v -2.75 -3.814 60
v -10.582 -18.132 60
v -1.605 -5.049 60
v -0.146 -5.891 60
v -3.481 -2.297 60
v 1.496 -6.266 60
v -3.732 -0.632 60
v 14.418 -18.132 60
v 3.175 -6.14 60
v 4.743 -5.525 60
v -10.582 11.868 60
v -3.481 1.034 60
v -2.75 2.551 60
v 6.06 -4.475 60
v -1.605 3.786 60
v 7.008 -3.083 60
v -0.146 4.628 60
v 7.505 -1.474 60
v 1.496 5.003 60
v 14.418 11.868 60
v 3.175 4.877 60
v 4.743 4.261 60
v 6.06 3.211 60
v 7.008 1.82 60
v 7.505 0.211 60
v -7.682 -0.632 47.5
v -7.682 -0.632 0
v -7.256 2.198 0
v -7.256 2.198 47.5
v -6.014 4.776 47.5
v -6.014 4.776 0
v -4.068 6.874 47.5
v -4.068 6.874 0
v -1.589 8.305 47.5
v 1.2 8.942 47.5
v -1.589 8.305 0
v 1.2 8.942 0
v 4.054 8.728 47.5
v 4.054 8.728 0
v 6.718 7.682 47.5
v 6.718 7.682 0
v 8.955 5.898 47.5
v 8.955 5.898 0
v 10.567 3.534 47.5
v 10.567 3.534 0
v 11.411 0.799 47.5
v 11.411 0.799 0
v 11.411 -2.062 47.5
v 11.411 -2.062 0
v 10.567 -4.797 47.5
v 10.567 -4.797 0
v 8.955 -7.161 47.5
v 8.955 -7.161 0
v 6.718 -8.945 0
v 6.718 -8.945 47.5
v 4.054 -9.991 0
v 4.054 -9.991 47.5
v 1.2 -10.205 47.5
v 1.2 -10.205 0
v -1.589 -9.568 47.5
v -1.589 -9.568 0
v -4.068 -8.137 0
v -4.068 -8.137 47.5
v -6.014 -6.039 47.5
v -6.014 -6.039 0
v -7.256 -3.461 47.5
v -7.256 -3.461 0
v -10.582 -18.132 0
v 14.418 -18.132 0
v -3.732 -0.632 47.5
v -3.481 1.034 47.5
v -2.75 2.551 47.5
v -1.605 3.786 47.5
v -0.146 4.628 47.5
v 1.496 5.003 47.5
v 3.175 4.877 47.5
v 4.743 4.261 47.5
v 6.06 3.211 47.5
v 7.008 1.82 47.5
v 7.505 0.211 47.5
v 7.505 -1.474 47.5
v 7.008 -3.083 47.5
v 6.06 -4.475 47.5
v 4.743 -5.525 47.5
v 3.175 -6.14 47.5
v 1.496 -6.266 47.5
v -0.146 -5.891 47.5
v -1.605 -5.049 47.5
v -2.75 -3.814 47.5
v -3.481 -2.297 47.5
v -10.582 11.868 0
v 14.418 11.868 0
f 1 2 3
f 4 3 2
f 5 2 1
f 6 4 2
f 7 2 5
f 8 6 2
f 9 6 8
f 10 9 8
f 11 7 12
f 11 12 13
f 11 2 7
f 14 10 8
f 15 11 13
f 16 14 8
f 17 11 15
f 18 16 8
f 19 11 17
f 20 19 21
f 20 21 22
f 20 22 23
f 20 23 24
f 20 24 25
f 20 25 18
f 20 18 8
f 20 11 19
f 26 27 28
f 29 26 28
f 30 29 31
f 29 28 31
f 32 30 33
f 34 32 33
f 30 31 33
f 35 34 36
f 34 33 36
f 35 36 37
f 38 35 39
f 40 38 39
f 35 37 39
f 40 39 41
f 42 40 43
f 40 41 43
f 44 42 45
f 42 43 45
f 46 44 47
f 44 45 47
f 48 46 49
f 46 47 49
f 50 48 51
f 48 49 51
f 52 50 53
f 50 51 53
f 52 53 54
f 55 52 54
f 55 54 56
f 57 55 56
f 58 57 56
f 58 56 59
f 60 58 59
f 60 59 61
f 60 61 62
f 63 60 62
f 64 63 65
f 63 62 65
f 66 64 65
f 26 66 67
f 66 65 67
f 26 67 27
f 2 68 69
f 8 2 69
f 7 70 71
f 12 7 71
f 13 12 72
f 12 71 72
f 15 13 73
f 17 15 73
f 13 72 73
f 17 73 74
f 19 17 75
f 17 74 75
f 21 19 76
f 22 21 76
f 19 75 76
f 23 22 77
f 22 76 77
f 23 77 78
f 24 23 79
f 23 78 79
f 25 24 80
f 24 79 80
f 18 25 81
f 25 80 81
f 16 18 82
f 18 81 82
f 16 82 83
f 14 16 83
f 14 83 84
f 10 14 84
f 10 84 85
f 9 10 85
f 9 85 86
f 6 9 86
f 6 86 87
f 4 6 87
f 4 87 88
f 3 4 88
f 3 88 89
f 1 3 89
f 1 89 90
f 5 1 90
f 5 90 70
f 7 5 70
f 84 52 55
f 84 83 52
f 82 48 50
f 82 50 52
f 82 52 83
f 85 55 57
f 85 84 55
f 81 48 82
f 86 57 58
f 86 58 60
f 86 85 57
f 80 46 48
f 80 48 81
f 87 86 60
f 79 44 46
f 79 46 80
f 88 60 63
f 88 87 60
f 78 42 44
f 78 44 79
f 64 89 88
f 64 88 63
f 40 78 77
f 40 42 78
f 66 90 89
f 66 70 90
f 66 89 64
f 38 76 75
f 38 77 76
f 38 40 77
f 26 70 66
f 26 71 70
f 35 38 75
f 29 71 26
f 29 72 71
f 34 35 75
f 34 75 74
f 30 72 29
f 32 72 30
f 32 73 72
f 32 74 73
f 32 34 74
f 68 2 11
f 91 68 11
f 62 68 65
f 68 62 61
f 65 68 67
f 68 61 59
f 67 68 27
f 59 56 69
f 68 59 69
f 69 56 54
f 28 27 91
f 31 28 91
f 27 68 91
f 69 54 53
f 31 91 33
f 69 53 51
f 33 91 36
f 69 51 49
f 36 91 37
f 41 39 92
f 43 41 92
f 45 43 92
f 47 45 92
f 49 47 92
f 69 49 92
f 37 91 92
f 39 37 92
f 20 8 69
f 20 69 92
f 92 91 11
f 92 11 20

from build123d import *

# Parameters (mm, degrees)
SKETCH_1_W          = 25
SKETCH_1_H          = 30
EXTRUDE_1_DEPTH     = 60
SKETCH_2_R          = 9.6
CUT_EXTRUDE_1_DEPTH = 47.5
SKETCH_3_R          = 5.65
CUT_EXTRUDE_2_DEPTH = 13.5


with BuildPart() as part:
    # ｽｹｯﾁ1 → ﾎﾞｽ - 押し出し1 (new body)
    with BuildSketch(Plane.XY):
        with Locations((1.917887822, -3.131578947)):
            Rectangle(SKETCH_1_W, SKETCH_1_H)
    extrude(amount=EXTRUDE_1_DEPTH)

    # ｽｹｯﾁ2 → ｶｯﾄ - 押し出し1 (cut)
    with BuildSketch(Plane(origin=(0, 0, 0), x_dir=(-1, 0, 0), z_dir=(0, 0, -1))):
        with Locations((-1.917887822, -0.631578947)):
            Circle(SKETCH_2_R)
    extrude(amount=-CUT_EXTRUDE_1_DEPTH, mode=Mode.SUBTRACT)

    # ｽｹｯﾁ3 → ｶｯﾄ - 押し出し2 (cut, through all)
    with BuildSketch(Plane(origin=(0, 0, 47.5), x_dir=(-1, 0, 0), z_dir=(0, 0, -1))):
        with Locations((-1.917887822, -0.631578947)):
            Circle(SKETCH_3_R)
    extrude(amount=-CUT_EXTRUDE_2_DEPTH, mode=Mode.SUBTRACT)


solid = part.part
